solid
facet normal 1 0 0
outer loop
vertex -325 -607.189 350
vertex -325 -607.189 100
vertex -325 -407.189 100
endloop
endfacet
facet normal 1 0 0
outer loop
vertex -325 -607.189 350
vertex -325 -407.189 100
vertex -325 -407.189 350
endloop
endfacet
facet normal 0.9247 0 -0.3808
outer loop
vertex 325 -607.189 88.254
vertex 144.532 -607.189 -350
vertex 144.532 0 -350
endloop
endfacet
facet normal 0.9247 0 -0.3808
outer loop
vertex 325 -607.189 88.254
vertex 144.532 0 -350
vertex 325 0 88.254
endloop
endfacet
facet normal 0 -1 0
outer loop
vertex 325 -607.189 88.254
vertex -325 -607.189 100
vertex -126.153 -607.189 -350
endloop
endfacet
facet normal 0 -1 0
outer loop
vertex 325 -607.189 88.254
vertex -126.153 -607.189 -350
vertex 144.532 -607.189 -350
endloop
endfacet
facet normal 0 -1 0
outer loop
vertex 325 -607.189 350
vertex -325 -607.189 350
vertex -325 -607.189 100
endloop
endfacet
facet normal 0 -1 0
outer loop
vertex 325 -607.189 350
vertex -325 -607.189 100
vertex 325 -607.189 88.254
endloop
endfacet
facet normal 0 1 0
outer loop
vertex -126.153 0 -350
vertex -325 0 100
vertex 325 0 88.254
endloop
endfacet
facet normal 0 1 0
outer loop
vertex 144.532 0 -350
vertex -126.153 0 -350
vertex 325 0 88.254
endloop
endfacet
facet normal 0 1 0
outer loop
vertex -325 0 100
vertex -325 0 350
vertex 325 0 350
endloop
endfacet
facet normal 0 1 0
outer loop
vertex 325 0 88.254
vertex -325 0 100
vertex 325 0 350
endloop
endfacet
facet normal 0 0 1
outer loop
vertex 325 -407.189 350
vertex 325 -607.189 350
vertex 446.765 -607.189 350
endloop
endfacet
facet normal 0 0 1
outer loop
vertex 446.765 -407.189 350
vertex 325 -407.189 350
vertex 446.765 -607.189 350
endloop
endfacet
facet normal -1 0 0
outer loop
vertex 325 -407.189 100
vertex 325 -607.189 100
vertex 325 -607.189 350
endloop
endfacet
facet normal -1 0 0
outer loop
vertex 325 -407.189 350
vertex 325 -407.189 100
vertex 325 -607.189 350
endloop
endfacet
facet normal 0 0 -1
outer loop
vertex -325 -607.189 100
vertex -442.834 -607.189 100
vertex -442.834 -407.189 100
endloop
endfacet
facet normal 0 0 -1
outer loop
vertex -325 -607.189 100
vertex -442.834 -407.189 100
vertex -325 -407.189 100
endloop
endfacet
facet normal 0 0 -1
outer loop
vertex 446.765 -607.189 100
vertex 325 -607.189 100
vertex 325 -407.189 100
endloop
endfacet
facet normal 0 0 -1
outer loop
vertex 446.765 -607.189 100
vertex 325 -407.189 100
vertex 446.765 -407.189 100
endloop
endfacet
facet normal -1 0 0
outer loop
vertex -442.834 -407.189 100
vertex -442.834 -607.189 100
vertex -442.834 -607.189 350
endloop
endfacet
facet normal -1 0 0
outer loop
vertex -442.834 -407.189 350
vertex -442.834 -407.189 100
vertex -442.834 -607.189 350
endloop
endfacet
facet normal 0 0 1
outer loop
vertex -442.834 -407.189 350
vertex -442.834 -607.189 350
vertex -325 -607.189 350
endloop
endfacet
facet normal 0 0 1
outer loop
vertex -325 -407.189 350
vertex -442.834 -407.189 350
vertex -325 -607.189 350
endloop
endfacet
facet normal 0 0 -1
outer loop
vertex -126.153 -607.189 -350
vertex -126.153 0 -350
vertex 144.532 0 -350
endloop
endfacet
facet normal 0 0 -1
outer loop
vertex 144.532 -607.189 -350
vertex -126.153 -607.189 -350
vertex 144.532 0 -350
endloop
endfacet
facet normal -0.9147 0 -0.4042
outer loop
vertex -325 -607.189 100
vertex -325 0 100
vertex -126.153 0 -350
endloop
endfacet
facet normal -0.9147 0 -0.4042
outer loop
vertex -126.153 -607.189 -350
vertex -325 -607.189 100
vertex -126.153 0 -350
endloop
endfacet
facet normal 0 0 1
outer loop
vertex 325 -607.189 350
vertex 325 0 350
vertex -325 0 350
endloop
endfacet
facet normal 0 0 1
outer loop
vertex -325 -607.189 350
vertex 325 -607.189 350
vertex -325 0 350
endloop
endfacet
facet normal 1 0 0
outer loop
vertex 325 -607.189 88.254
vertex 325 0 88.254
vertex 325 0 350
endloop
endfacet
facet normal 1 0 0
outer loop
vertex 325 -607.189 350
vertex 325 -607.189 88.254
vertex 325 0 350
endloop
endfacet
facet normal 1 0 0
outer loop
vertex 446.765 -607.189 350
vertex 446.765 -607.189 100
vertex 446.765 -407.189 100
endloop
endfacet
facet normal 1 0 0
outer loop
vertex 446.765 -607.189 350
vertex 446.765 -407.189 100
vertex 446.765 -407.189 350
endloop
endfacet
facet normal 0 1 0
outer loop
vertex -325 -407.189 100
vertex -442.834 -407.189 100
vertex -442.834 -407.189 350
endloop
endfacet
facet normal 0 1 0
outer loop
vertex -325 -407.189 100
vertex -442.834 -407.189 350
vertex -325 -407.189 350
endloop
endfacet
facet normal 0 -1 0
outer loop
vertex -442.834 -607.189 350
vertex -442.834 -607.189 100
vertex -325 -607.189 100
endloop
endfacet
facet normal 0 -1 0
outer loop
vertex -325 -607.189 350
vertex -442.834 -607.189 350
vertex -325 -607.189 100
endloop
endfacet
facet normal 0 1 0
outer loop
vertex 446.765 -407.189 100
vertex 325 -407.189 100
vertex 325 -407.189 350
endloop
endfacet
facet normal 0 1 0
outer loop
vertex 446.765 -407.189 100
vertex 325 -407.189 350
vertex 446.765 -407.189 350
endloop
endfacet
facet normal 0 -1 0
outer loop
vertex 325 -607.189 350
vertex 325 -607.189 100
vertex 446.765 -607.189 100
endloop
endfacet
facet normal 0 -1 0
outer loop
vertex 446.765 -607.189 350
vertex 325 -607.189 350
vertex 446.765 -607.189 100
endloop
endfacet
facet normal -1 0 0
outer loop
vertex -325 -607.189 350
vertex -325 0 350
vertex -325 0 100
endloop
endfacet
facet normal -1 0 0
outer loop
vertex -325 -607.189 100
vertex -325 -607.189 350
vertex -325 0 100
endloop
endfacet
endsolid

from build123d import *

# Parameters (mm, degrees)
F1_DEPTH = 607.1892
F2_W     = 117.834198
F2_H     = 250
F2_W_2   = 121.764678
F3_DEPTH = 200


with BuildPart() as f1:
    # F0 (on Front) → F1 (new body)
    with BuildSketch(Plane.XZ):
        Polygon((325, 88.254139), (325, 350), (-325, 350), (-325, 100), (-126.152575, -350), (144.531921, -350), align=None)
    extrude(amount=F1_DEPTH)


with BuildPart() as f3:
    # F2 (on face) → F3 (new body)
    with BuildSketch(Plane.XZ.offset(607.1892)):
        with Locations((-383.917099, 225)):
            Rectangle(F2_W, F2_H)
        with Locations((385.882339, 225)):
            Rectangle(F2_W_2, F2_H)
    extrude(amount=-F3_DEPTH)


solid = Compound([f1.part, f3.part])
